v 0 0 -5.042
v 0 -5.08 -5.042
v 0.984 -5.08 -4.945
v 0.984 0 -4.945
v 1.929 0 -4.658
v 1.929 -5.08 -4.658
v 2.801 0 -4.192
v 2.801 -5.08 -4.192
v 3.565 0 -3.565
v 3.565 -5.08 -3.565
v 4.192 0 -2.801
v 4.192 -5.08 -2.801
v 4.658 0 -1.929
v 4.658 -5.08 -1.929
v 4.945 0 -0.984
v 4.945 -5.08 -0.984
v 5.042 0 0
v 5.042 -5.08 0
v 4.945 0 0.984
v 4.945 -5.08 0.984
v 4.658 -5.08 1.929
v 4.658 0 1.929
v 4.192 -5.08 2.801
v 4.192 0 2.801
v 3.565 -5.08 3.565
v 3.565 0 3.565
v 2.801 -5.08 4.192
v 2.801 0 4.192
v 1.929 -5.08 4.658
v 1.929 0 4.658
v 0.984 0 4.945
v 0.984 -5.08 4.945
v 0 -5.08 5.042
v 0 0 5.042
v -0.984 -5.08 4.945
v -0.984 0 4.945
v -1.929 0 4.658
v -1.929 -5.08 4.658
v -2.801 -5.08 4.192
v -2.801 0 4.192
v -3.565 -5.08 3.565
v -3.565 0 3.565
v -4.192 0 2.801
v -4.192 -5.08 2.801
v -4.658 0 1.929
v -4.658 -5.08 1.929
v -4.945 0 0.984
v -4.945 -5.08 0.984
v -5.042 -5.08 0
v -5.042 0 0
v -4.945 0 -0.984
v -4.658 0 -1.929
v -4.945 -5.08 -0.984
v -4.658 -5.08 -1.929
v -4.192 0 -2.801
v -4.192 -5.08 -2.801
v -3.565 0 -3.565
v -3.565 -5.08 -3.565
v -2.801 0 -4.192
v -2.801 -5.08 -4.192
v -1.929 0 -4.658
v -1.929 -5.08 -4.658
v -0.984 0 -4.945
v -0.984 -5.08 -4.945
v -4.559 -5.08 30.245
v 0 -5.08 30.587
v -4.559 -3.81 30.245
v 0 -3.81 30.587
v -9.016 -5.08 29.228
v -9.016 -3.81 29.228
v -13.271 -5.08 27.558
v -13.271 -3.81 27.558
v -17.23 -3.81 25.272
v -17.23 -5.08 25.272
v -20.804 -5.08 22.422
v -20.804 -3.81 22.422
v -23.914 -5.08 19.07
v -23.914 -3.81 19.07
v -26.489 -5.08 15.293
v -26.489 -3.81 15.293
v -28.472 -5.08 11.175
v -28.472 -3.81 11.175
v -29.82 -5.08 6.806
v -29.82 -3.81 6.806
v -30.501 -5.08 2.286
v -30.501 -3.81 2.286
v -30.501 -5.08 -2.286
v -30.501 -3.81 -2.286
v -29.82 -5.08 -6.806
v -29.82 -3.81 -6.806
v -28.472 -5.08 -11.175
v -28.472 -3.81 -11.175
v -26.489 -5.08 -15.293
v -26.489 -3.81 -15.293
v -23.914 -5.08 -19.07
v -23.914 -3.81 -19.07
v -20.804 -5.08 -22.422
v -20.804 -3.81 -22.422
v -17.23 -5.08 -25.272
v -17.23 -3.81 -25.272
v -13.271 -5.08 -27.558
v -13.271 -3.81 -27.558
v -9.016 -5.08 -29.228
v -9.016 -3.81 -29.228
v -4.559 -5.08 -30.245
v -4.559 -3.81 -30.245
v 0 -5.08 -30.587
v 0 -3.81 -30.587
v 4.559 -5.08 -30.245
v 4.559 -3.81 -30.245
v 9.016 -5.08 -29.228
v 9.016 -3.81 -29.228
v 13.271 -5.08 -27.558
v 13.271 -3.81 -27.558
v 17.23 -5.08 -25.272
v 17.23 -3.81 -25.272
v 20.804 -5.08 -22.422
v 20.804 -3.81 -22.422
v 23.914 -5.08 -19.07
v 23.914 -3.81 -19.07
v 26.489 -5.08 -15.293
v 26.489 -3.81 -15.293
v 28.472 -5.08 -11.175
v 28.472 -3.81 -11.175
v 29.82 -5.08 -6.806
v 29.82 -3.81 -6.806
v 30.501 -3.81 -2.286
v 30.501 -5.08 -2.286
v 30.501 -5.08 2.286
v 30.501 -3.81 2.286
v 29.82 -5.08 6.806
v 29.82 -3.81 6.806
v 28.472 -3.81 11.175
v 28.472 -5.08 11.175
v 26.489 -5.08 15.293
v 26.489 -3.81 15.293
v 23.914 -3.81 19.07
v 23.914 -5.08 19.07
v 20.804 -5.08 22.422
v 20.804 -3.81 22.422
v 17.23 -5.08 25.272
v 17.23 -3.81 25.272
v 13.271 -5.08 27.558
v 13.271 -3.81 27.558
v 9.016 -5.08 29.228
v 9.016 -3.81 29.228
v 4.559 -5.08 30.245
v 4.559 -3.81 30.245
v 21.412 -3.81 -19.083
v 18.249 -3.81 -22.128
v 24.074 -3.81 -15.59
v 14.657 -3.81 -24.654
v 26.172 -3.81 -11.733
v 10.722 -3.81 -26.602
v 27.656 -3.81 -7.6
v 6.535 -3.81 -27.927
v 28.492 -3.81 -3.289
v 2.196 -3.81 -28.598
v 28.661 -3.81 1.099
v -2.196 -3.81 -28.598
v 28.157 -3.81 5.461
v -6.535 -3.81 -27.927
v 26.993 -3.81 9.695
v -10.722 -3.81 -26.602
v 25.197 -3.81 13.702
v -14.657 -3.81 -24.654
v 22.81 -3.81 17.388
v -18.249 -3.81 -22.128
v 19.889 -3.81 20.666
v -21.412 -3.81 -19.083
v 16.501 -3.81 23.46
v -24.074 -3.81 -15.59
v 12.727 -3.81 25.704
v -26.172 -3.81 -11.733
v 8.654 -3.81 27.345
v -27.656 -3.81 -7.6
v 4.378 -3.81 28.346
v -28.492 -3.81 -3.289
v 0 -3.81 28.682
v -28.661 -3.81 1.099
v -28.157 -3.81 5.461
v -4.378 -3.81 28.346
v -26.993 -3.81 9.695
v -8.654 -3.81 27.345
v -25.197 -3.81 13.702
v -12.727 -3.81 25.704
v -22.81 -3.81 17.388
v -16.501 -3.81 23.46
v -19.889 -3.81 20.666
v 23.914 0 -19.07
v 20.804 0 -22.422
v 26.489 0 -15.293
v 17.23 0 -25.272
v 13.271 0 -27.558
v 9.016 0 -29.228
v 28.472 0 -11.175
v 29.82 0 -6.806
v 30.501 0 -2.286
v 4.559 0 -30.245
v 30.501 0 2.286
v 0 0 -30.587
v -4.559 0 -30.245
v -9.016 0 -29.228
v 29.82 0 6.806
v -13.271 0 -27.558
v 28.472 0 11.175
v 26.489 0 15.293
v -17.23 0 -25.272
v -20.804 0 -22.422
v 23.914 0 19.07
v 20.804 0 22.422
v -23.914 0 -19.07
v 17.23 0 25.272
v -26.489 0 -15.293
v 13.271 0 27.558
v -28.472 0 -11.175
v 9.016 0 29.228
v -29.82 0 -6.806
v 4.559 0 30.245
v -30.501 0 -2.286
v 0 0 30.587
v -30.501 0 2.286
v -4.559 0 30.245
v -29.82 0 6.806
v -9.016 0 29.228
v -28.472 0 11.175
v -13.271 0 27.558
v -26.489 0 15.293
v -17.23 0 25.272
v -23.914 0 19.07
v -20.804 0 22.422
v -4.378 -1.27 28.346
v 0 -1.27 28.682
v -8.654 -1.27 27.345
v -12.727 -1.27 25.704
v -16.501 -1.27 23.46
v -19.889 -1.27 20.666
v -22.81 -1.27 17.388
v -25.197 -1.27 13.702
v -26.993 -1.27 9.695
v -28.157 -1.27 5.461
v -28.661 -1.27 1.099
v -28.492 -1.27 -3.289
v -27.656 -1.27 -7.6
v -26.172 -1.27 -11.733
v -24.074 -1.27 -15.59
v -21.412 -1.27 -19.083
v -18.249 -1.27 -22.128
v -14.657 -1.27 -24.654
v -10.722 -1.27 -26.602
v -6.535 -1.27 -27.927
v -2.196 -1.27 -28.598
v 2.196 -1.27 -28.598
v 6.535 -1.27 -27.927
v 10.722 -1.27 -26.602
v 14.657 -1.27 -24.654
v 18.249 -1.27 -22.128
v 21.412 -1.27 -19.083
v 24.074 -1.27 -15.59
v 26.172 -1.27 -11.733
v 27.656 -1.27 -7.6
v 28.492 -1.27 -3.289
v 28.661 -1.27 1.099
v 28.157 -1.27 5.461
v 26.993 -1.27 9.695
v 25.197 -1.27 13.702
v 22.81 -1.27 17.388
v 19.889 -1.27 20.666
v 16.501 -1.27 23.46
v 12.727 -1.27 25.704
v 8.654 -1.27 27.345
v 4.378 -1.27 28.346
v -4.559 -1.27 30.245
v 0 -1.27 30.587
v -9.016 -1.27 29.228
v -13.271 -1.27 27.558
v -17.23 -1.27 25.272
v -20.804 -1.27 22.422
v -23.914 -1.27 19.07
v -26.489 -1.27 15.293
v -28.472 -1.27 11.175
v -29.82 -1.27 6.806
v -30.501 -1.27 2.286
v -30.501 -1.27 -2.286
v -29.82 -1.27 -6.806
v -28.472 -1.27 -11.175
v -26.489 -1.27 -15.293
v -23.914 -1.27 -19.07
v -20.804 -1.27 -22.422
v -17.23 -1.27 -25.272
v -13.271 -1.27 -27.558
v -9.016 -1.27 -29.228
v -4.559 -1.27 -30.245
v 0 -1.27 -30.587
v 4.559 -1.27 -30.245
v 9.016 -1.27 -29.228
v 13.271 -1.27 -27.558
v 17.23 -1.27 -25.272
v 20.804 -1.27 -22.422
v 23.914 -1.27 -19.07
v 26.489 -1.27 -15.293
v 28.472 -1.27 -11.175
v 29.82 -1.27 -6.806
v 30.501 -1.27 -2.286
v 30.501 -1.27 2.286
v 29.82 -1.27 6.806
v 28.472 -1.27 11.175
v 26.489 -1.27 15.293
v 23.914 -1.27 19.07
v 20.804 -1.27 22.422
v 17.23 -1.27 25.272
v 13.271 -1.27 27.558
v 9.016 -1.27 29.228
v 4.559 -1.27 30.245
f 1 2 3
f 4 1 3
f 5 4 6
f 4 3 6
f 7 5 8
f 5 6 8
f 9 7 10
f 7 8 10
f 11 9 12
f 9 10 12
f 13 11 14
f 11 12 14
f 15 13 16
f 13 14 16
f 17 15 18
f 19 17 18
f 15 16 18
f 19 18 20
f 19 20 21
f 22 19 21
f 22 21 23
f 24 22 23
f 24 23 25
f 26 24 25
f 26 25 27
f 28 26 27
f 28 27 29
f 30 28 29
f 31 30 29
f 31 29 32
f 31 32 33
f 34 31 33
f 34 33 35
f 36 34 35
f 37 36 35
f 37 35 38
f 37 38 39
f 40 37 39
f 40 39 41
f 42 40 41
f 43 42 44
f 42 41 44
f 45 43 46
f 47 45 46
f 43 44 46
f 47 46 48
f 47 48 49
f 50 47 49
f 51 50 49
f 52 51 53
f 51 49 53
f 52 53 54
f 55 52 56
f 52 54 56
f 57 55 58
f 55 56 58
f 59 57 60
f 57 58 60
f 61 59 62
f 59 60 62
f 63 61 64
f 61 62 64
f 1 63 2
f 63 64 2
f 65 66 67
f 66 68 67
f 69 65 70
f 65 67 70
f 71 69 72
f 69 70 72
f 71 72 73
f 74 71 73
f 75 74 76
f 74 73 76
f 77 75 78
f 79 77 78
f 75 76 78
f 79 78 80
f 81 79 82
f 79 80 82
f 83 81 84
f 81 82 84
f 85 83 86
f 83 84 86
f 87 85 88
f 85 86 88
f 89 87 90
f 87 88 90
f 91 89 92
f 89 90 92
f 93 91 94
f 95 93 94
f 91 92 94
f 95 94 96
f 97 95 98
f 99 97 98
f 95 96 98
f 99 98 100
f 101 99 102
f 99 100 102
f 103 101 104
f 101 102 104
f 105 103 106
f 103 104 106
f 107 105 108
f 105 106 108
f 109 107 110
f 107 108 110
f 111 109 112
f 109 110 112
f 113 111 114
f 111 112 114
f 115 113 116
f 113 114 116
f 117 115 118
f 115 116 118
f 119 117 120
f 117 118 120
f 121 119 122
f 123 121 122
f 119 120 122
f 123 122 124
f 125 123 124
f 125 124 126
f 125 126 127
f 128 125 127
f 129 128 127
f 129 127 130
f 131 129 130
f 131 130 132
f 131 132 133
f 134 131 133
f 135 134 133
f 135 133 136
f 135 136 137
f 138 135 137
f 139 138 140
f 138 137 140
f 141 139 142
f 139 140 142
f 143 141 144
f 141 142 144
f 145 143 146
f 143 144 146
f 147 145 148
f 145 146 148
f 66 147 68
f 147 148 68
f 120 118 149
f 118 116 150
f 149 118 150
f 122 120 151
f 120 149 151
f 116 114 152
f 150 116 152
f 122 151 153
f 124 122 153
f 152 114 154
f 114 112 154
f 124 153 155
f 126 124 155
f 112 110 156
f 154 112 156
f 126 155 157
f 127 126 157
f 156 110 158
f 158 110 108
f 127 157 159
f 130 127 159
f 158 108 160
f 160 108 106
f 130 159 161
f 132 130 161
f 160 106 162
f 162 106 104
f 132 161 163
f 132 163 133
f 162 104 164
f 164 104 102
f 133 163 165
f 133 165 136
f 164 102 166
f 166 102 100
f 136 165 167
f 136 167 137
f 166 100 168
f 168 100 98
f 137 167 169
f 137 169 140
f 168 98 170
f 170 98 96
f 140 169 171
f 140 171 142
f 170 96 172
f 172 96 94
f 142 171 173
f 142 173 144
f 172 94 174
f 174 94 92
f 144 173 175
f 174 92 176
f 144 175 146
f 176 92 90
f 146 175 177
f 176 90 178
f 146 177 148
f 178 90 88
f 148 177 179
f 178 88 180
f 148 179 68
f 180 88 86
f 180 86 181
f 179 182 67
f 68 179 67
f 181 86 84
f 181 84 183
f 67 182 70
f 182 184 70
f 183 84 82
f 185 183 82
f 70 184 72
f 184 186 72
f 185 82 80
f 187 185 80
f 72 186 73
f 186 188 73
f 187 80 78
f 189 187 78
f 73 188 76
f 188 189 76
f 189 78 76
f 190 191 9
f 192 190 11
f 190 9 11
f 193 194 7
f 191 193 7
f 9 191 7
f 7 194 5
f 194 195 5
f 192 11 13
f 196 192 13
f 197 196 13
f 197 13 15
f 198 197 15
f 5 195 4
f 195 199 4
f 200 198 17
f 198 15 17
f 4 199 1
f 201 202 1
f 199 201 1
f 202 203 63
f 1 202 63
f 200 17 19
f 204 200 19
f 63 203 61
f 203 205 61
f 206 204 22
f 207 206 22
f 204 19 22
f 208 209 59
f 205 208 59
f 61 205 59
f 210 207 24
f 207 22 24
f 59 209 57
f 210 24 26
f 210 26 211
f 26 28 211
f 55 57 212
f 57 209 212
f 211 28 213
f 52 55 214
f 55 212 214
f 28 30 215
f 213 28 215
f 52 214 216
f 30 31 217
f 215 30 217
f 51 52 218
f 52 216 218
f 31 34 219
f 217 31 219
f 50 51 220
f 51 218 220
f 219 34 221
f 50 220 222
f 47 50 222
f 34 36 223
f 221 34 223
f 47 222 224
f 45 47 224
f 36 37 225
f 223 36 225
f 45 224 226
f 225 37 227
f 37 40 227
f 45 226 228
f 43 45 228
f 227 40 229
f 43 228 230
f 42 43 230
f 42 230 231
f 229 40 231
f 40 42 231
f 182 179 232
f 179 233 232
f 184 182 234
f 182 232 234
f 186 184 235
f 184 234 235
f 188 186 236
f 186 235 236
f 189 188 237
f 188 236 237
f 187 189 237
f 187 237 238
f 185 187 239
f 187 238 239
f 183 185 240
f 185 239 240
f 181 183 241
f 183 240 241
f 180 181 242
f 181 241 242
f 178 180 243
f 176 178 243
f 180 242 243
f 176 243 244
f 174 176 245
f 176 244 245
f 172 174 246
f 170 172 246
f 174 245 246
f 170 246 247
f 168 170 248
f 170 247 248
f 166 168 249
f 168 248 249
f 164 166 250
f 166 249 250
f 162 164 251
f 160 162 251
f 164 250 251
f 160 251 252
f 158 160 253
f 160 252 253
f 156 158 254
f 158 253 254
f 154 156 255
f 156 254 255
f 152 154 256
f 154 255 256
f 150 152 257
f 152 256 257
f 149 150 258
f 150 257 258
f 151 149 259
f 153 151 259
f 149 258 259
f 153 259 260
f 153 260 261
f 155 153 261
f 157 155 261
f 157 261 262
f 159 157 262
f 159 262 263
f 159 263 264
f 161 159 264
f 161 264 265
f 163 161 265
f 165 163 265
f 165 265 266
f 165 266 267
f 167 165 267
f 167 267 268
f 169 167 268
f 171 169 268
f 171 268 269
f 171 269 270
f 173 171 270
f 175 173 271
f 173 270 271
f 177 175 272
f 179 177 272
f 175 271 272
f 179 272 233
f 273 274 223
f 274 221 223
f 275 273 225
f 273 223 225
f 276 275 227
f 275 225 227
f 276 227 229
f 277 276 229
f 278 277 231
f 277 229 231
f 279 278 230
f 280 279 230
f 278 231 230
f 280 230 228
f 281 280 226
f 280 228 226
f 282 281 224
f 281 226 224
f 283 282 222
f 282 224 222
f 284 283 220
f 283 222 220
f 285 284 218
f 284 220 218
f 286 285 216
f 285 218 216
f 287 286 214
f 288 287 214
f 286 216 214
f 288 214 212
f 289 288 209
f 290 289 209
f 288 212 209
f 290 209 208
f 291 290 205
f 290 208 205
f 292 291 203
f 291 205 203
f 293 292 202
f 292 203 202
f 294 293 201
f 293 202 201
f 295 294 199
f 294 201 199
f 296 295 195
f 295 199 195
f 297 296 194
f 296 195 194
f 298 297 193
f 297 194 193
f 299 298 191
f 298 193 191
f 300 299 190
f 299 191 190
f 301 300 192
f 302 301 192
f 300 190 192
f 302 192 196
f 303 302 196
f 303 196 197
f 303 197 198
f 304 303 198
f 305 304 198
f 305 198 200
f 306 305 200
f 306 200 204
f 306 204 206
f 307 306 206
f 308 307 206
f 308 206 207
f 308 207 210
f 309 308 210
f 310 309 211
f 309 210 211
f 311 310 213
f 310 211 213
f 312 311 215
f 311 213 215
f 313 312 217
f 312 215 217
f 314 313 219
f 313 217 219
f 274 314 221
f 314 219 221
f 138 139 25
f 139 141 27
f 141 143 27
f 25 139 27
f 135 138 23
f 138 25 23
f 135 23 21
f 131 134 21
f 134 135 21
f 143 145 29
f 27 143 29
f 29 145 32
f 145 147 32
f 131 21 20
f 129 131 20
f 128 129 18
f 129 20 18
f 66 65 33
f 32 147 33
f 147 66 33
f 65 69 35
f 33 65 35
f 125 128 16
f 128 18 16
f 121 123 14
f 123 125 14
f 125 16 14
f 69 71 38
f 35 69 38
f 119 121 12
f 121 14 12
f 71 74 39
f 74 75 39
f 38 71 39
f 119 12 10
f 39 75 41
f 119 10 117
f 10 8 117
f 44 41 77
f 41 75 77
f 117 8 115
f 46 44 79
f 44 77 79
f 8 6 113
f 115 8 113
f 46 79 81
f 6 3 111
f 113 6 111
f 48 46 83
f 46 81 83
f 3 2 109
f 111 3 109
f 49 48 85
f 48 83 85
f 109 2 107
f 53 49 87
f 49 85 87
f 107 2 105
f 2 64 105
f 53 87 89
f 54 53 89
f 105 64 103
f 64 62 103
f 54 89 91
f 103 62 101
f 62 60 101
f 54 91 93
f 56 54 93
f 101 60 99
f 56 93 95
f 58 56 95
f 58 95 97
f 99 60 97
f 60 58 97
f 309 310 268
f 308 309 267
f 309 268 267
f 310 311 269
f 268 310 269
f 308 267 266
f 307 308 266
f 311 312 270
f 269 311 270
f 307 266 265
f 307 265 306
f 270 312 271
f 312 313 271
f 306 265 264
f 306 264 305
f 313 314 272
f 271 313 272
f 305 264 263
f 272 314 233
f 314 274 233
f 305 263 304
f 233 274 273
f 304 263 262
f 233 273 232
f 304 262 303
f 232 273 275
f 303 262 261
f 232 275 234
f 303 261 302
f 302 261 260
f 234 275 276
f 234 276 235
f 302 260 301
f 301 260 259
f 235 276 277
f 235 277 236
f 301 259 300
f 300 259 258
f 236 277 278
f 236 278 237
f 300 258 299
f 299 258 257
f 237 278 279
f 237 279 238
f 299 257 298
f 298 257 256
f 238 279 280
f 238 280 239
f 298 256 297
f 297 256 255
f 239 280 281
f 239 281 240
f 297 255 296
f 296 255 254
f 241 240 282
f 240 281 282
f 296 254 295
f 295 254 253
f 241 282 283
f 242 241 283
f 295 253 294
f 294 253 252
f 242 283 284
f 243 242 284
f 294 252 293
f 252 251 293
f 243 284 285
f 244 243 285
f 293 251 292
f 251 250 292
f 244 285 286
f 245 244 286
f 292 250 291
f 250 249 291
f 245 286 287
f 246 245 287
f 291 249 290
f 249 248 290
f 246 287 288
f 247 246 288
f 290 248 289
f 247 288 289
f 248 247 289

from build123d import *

# Parameters (mm, degrees)
SKETCH6_R          = 5.0419
CUT_EXTRUDE1_DEPTH = 44.553374001


with BuildPart() as part:
    # Sketch1 → Revolve1 (revolve)
    with BuildSketch(Plane(origin=(0, 0, 0), x_dir=(0, 0, -1), z_dir=(1, 0, 0))):
        Polygon((0, 0), (0, -5.08), (-30.58668, -5.08), (-30.58668, -3.81), (-28.68168, -3.81), (-28.68168, -1.27), (-30.58668, -1.27), (-30.58668, 0), align=None)
    revolve(axis=Axis((0, 0, 0), (0, -1, 0)))

    # Sketch6 → Cut-Extrude1 (cut, through all)
    with BuildSketch(Plane.XZ.offset(5.08)):
        with Locations(Location((0, 0, 0), (0, 0, 270))):
            Circle(SKETCH6_R)
    extrude(amount=-CUT_EXTRUDE1_DEPTH, mode=Mode.SUBTRACT)


solid = part.part
